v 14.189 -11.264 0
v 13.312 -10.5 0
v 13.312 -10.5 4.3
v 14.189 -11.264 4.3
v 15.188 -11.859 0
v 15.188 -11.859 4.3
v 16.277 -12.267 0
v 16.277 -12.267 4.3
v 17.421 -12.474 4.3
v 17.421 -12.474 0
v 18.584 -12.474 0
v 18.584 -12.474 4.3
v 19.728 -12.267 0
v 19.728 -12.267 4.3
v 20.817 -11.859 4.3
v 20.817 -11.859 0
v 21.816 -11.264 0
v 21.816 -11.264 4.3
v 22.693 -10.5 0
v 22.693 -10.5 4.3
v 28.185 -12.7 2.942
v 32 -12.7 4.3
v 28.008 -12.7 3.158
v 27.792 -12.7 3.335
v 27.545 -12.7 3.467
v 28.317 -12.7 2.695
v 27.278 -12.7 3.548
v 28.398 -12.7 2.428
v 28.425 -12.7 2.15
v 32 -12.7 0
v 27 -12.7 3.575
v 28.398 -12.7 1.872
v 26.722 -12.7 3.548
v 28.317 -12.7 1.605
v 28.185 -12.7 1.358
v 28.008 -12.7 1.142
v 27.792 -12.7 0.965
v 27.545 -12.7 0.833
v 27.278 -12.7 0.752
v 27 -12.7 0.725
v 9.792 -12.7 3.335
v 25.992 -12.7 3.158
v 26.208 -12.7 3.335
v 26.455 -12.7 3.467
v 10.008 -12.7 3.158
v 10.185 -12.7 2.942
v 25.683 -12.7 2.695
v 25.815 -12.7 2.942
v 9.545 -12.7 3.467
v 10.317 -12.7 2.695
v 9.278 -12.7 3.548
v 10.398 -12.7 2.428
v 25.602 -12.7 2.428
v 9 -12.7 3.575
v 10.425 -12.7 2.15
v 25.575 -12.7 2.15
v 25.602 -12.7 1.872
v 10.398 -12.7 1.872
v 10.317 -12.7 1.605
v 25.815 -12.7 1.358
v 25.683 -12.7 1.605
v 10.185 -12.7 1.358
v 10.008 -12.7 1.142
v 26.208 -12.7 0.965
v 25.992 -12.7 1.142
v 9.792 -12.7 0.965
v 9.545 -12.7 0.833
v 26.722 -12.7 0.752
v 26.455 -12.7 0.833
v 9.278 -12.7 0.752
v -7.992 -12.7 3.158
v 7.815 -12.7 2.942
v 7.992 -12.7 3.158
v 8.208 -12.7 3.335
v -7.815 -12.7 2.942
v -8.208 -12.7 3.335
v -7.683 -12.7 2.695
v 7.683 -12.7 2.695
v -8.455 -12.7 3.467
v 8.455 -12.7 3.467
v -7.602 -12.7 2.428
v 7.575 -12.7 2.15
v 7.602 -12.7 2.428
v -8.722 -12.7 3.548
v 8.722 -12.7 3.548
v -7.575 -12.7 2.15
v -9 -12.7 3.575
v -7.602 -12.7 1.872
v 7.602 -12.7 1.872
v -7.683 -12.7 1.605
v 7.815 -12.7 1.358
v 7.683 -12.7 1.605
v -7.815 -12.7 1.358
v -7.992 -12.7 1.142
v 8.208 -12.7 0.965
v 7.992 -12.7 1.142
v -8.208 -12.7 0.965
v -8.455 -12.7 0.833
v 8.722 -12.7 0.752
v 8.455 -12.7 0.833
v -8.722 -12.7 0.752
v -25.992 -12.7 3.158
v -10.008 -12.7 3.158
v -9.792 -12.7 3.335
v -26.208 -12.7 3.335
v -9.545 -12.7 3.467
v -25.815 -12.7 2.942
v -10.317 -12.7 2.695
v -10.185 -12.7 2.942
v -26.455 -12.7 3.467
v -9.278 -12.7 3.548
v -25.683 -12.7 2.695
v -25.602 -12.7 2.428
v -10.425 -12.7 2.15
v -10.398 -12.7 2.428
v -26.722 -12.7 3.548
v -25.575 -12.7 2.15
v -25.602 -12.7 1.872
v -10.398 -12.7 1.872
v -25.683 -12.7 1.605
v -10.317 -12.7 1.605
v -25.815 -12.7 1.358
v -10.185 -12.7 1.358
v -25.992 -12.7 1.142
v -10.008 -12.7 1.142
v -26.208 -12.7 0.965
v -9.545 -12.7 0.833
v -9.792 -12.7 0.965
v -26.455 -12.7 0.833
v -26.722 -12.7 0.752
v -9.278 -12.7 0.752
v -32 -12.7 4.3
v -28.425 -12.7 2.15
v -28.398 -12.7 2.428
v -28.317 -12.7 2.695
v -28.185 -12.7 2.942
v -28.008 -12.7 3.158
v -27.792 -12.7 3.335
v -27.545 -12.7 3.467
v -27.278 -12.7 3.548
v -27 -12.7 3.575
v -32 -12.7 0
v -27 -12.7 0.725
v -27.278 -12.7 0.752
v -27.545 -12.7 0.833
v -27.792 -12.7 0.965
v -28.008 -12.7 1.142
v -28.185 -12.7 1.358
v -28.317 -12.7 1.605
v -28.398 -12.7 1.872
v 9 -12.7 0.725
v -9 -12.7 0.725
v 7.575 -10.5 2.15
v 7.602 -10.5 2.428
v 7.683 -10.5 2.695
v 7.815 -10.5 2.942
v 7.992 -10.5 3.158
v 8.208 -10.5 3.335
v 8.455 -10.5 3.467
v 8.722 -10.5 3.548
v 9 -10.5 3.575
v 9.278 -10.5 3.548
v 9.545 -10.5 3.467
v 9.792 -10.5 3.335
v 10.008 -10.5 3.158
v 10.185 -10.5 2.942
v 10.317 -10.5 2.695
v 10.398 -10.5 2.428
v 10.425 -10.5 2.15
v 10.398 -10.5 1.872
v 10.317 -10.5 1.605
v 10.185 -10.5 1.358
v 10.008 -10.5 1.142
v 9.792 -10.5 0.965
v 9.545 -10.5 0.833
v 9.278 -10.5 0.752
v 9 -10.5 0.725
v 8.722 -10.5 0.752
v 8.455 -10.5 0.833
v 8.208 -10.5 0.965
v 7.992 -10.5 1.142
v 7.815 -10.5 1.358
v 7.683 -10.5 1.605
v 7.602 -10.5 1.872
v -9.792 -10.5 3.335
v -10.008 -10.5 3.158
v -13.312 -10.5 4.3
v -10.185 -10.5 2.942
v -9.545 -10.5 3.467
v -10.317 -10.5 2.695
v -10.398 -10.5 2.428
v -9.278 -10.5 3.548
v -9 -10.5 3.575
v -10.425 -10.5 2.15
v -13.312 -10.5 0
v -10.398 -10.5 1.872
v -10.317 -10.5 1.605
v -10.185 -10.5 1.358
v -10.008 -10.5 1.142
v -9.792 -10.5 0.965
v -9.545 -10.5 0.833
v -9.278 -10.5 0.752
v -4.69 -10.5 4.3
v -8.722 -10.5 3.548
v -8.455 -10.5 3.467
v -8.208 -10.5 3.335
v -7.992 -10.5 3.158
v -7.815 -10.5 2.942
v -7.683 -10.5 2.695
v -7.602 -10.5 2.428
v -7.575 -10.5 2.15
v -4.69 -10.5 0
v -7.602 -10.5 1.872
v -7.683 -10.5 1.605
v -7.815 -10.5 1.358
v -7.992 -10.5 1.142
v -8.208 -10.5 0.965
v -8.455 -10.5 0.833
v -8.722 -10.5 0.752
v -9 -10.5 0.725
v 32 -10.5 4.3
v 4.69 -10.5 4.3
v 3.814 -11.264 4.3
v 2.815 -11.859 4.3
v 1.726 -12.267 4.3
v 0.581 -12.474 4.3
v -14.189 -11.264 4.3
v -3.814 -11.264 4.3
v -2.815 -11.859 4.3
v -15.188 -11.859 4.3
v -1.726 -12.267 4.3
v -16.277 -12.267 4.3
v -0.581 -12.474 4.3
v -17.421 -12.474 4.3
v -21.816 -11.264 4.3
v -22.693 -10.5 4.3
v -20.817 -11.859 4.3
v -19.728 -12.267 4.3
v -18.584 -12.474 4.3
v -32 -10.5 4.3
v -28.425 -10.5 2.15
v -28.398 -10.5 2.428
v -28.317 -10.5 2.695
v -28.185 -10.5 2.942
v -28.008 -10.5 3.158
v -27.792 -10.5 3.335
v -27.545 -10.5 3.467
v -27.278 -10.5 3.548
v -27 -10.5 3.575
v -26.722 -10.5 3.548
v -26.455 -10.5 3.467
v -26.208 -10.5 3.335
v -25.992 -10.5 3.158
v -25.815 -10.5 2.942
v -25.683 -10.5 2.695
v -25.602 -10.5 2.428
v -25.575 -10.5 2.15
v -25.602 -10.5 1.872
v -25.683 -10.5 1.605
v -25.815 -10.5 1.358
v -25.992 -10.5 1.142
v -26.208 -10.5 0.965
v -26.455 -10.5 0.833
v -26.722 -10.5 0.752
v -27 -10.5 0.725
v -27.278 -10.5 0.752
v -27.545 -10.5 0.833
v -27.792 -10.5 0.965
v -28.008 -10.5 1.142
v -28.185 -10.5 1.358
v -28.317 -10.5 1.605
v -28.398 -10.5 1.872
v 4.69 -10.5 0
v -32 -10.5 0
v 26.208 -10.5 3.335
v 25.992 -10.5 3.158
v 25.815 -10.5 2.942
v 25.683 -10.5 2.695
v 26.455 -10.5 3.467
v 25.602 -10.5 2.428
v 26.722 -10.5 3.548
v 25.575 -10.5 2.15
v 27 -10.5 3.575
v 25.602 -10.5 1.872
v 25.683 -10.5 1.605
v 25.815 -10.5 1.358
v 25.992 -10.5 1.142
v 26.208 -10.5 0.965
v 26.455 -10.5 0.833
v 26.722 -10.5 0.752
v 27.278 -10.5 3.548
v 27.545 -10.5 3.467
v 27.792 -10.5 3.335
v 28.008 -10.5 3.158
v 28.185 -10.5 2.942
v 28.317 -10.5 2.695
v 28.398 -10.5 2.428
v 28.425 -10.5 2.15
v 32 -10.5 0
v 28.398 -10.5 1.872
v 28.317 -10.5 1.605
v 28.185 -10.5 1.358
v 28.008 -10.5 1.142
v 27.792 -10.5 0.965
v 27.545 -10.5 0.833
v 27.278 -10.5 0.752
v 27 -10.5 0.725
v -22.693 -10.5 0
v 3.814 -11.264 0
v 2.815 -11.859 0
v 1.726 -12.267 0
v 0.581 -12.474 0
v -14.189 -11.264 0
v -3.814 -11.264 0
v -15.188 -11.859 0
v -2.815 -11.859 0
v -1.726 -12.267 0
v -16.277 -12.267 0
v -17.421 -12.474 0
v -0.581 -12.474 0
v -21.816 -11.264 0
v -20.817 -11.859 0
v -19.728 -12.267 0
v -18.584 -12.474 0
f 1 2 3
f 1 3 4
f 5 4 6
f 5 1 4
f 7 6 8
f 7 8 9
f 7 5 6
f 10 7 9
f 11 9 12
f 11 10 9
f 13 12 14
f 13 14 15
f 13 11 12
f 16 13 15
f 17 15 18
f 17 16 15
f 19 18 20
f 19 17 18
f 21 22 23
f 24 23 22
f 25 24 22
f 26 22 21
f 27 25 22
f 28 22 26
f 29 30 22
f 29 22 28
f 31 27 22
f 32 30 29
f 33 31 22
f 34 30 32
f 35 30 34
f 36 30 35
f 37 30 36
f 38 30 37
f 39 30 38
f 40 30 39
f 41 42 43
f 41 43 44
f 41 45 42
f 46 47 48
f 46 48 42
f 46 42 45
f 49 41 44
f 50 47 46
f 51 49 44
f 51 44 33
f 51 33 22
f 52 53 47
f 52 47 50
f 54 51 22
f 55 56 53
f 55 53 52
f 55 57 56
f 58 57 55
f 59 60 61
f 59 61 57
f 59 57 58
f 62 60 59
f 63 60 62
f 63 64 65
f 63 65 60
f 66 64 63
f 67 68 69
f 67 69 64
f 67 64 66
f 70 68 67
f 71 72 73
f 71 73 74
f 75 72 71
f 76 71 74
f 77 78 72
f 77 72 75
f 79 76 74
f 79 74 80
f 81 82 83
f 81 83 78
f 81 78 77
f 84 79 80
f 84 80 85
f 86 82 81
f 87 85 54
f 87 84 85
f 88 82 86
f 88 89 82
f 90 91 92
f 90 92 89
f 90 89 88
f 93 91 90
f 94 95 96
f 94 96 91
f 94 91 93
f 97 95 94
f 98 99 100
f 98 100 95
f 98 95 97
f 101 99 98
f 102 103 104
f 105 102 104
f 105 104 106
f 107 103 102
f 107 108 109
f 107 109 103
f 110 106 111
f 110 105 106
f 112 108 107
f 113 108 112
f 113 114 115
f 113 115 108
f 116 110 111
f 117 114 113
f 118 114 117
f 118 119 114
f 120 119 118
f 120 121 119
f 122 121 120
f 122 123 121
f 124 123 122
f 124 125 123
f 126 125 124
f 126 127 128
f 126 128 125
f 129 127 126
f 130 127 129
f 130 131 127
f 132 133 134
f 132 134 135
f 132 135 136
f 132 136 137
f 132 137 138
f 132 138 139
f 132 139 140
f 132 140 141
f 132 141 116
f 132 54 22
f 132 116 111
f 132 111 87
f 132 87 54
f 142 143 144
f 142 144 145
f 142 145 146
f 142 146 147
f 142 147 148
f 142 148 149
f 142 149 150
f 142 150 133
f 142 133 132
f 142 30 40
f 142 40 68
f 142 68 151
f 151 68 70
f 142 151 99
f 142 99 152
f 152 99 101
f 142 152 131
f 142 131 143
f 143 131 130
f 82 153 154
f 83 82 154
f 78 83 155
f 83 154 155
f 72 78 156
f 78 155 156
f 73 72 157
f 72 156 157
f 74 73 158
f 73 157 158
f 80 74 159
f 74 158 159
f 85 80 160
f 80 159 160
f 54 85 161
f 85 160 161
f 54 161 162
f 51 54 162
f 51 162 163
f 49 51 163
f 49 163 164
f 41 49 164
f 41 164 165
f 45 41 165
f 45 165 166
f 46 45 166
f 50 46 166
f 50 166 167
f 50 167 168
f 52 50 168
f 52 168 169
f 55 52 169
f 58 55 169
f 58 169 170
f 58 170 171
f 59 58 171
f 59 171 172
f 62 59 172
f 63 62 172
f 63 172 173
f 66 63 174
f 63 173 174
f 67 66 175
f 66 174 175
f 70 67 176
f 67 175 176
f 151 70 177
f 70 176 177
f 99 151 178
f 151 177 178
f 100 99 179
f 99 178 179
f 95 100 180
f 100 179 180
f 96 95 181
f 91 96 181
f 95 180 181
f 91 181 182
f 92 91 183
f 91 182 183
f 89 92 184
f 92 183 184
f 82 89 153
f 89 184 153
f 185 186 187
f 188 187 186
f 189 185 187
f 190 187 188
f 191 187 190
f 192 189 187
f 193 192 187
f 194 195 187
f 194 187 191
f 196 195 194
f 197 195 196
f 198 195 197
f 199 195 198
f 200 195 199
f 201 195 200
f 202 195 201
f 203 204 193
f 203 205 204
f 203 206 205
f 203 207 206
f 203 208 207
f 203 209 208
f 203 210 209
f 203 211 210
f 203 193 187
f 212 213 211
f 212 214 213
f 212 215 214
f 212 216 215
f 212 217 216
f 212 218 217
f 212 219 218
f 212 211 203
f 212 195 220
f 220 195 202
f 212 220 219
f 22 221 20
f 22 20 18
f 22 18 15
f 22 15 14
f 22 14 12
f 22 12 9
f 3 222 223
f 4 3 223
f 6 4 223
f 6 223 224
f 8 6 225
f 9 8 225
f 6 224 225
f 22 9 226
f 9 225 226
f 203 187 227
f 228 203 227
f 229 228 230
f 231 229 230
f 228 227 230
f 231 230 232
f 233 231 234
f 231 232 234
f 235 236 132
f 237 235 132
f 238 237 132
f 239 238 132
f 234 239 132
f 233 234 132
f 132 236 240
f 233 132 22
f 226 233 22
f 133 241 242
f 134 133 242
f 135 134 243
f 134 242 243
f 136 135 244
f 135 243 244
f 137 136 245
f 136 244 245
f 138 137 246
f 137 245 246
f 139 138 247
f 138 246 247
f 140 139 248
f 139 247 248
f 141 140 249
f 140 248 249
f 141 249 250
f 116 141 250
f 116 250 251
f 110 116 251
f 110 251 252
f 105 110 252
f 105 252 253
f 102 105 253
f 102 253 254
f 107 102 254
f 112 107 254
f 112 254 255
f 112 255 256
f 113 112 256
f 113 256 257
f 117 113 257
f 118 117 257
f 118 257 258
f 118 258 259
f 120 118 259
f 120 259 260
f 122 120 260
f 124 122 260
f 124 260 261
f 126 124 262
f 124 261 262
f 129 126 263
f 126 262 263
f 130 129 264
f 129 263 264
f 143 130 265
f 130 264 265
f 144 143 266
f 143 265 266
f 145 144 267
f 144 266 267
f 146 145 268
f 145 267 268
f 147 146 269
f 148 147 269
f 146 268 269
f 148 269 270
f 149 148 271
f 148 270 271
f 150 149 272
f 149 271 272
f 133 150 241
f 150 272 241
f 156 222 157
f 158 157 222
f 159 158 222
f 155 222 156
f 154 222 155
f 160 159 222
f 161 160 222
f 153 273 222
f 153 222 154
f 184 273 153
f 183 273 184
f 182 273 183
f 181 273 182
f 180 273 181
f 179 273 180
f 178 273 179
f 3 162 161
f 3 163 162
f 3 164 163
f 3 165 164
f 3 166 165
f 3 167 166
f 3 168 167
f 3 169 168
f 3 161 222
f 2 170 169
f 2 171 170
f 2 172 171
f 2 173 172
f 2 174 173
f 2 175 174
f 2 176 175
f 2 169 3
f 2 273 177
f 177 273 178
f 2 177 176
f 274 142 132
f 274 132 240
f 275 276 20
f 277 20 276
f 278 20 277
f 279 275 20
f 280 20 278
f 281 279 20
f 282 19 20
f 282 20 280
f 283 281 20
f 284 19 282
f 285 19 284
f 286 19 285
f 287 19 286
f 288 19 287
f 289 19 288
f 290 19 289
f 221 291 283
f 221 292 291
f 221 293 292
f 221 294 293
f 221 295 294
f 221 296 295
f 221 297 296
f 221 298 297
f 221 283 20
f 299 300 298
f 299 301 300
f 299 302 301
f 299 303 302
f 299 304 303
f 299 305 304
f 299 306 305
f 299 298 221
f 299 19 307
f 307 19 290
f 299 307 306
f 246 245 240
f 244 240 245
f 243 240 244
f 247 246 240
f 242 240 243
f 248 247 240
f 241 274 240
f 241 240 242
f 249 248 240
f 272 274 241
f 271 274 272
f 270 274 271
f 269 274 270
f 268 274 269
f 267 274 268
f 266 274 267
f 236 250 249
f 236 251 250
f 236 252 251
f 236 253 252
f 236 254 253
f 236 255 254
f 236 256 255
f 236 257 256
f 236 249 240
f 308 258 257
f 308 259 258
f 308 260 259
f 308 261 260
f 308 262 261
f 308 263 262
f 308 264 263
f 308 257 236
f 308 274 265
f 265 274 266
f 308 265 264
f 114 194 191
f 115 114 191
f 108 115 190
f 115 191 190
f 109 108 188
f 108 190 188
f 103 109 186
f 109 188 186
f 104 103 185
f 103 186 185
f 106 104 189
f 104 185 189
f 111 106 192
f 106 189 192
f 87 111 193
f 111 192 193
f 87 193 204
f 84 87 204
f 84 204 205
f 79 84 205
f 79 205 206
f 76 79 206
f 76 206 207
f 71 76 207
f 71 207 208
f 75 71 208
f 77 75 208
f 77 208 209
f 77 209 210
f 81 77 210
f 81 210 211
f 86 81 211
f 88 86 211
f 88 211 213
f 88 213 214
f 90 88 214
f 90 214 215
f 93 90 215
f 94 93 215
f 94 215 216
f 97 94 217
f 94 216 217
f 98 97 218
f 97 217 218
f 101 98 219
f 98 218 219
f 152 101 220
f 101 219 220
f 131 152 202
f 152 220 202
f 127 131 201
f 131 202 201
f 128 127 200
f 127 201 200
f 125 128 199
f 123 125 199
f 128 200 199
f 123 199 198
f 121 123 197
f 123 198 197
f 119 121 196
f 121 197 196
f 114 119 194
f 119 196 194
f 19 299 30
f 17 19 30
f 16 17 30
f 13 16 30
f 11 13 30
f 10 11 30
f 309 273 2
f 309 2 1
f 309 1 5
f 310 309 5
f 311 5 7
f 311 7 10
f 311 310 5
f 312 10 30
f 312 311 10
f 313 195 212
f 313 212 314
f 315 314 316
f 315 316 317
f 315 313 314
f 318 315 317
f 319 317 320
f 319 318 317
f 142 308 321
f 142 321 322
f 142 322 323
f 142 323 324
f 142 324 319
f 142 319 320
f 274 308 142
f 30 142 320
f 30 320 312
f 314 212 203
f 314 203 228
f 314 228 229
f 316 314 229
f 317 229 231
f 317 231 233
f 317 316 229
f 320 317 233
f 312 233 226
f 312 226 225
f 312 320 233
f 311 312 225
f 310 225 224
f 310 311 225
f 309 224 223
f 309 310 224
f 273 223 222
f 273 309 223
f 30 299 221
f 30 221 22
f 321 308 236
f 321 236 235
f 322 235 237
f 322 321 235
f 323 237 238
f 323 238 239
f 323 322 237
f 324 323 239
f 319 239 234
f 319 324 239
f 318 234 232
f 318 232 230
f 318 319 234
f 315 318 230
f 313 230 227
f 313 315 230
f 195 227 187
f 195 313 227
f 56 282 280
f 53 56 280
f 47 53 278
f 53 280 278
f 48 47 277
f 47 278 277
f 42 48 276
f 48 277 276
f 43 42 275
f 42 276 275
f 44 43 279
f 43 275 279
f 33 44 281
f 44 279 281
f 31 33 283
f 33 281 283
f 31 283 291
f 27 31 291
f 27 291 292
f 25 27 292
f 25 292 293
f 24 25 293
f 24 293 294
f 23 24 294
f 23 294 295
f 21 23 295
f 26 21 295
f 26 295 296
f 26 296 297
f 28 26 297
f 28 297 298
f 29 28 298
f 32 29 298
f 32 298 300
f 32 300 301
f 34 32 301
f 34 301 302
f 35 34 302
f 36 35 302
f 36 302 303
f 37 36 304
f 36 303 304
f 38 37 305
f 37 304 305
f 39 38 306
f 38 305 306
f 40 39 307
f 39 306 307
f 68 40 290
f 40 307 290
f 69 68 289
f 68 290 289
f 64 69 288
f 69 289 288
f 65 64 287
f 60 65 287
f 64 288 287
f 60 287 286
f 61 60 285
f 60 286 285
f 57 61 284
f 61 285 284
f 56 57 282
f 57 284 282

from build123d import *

# Parameters (mm, degrees)
BOSS_EXTRUDE1_DEPTH = 4.3
SKETCH2_R           = 1.425
CUT_EXTRUDE1_DEPTH  = 33.362478273


with BuildPart() as part:
    # Sketch1 → Boss-Extrude1 (new body)
    with BuildSketch(Plane.XY):
        with BuildLine():
            Line((-13.312338898, -10.5), (-4.69041576, -10.5))
            ThreePointArc((-4.69041576, -10.5), (0, -12.5), (4.69041576, -10.5))
            Line((4.69041576, -10.5), (13.312338898, -10.5))
            ThreePointArc((13.312338898, -10.5), (18.002754658, -12.5), (22.693170418, -10.5))
            Line((22.693170418, -10.5), (32, -10.5))
            Line((32, -10.5), (32, -12.7))
            Line((32, -12.7), (-32, -12.7))
            Line((-32, -12.7), (-32, -10.5))
            Line((-32, -10.5), (-22.693170418, -10.5))
            ThreePointArc((-22.693170418, -10.5), (-18.002754658, -12.5), (-13.312338898, -10.5))
        make_face()
    extrude(amount=BOSS_EXTRUDE1_DEPTH)

    # Sketch2 → Cut-Extrude1 (cut, through all)
    with BuildSketch(Plane(origin=(0, -10.5, 0), x_dir=(1, 0, 0), z_dir=(0, 1, 0))):
        with Locations(Location((-9, -2.15, 0), (0, 0, 180))):
            Circle(SKETCH2_R)
        with Locations(Location((9, -2.15, 0), (0, 0, 180))):
            Circle(SKETCH2_R)
        with Locations(Location((-27, -2.15, 0), (0, 0, 180))):
            Circle(SKETCH2_R)
        with Locations(Location((27, -2.15, 0), (0, 0, 180))):
            Circle(SKETCH2_R)
    extrude(amount=-CUT_EXTRUDE1_DEPTH, mode=Mode.SUBTRACT)


solid = part.part
